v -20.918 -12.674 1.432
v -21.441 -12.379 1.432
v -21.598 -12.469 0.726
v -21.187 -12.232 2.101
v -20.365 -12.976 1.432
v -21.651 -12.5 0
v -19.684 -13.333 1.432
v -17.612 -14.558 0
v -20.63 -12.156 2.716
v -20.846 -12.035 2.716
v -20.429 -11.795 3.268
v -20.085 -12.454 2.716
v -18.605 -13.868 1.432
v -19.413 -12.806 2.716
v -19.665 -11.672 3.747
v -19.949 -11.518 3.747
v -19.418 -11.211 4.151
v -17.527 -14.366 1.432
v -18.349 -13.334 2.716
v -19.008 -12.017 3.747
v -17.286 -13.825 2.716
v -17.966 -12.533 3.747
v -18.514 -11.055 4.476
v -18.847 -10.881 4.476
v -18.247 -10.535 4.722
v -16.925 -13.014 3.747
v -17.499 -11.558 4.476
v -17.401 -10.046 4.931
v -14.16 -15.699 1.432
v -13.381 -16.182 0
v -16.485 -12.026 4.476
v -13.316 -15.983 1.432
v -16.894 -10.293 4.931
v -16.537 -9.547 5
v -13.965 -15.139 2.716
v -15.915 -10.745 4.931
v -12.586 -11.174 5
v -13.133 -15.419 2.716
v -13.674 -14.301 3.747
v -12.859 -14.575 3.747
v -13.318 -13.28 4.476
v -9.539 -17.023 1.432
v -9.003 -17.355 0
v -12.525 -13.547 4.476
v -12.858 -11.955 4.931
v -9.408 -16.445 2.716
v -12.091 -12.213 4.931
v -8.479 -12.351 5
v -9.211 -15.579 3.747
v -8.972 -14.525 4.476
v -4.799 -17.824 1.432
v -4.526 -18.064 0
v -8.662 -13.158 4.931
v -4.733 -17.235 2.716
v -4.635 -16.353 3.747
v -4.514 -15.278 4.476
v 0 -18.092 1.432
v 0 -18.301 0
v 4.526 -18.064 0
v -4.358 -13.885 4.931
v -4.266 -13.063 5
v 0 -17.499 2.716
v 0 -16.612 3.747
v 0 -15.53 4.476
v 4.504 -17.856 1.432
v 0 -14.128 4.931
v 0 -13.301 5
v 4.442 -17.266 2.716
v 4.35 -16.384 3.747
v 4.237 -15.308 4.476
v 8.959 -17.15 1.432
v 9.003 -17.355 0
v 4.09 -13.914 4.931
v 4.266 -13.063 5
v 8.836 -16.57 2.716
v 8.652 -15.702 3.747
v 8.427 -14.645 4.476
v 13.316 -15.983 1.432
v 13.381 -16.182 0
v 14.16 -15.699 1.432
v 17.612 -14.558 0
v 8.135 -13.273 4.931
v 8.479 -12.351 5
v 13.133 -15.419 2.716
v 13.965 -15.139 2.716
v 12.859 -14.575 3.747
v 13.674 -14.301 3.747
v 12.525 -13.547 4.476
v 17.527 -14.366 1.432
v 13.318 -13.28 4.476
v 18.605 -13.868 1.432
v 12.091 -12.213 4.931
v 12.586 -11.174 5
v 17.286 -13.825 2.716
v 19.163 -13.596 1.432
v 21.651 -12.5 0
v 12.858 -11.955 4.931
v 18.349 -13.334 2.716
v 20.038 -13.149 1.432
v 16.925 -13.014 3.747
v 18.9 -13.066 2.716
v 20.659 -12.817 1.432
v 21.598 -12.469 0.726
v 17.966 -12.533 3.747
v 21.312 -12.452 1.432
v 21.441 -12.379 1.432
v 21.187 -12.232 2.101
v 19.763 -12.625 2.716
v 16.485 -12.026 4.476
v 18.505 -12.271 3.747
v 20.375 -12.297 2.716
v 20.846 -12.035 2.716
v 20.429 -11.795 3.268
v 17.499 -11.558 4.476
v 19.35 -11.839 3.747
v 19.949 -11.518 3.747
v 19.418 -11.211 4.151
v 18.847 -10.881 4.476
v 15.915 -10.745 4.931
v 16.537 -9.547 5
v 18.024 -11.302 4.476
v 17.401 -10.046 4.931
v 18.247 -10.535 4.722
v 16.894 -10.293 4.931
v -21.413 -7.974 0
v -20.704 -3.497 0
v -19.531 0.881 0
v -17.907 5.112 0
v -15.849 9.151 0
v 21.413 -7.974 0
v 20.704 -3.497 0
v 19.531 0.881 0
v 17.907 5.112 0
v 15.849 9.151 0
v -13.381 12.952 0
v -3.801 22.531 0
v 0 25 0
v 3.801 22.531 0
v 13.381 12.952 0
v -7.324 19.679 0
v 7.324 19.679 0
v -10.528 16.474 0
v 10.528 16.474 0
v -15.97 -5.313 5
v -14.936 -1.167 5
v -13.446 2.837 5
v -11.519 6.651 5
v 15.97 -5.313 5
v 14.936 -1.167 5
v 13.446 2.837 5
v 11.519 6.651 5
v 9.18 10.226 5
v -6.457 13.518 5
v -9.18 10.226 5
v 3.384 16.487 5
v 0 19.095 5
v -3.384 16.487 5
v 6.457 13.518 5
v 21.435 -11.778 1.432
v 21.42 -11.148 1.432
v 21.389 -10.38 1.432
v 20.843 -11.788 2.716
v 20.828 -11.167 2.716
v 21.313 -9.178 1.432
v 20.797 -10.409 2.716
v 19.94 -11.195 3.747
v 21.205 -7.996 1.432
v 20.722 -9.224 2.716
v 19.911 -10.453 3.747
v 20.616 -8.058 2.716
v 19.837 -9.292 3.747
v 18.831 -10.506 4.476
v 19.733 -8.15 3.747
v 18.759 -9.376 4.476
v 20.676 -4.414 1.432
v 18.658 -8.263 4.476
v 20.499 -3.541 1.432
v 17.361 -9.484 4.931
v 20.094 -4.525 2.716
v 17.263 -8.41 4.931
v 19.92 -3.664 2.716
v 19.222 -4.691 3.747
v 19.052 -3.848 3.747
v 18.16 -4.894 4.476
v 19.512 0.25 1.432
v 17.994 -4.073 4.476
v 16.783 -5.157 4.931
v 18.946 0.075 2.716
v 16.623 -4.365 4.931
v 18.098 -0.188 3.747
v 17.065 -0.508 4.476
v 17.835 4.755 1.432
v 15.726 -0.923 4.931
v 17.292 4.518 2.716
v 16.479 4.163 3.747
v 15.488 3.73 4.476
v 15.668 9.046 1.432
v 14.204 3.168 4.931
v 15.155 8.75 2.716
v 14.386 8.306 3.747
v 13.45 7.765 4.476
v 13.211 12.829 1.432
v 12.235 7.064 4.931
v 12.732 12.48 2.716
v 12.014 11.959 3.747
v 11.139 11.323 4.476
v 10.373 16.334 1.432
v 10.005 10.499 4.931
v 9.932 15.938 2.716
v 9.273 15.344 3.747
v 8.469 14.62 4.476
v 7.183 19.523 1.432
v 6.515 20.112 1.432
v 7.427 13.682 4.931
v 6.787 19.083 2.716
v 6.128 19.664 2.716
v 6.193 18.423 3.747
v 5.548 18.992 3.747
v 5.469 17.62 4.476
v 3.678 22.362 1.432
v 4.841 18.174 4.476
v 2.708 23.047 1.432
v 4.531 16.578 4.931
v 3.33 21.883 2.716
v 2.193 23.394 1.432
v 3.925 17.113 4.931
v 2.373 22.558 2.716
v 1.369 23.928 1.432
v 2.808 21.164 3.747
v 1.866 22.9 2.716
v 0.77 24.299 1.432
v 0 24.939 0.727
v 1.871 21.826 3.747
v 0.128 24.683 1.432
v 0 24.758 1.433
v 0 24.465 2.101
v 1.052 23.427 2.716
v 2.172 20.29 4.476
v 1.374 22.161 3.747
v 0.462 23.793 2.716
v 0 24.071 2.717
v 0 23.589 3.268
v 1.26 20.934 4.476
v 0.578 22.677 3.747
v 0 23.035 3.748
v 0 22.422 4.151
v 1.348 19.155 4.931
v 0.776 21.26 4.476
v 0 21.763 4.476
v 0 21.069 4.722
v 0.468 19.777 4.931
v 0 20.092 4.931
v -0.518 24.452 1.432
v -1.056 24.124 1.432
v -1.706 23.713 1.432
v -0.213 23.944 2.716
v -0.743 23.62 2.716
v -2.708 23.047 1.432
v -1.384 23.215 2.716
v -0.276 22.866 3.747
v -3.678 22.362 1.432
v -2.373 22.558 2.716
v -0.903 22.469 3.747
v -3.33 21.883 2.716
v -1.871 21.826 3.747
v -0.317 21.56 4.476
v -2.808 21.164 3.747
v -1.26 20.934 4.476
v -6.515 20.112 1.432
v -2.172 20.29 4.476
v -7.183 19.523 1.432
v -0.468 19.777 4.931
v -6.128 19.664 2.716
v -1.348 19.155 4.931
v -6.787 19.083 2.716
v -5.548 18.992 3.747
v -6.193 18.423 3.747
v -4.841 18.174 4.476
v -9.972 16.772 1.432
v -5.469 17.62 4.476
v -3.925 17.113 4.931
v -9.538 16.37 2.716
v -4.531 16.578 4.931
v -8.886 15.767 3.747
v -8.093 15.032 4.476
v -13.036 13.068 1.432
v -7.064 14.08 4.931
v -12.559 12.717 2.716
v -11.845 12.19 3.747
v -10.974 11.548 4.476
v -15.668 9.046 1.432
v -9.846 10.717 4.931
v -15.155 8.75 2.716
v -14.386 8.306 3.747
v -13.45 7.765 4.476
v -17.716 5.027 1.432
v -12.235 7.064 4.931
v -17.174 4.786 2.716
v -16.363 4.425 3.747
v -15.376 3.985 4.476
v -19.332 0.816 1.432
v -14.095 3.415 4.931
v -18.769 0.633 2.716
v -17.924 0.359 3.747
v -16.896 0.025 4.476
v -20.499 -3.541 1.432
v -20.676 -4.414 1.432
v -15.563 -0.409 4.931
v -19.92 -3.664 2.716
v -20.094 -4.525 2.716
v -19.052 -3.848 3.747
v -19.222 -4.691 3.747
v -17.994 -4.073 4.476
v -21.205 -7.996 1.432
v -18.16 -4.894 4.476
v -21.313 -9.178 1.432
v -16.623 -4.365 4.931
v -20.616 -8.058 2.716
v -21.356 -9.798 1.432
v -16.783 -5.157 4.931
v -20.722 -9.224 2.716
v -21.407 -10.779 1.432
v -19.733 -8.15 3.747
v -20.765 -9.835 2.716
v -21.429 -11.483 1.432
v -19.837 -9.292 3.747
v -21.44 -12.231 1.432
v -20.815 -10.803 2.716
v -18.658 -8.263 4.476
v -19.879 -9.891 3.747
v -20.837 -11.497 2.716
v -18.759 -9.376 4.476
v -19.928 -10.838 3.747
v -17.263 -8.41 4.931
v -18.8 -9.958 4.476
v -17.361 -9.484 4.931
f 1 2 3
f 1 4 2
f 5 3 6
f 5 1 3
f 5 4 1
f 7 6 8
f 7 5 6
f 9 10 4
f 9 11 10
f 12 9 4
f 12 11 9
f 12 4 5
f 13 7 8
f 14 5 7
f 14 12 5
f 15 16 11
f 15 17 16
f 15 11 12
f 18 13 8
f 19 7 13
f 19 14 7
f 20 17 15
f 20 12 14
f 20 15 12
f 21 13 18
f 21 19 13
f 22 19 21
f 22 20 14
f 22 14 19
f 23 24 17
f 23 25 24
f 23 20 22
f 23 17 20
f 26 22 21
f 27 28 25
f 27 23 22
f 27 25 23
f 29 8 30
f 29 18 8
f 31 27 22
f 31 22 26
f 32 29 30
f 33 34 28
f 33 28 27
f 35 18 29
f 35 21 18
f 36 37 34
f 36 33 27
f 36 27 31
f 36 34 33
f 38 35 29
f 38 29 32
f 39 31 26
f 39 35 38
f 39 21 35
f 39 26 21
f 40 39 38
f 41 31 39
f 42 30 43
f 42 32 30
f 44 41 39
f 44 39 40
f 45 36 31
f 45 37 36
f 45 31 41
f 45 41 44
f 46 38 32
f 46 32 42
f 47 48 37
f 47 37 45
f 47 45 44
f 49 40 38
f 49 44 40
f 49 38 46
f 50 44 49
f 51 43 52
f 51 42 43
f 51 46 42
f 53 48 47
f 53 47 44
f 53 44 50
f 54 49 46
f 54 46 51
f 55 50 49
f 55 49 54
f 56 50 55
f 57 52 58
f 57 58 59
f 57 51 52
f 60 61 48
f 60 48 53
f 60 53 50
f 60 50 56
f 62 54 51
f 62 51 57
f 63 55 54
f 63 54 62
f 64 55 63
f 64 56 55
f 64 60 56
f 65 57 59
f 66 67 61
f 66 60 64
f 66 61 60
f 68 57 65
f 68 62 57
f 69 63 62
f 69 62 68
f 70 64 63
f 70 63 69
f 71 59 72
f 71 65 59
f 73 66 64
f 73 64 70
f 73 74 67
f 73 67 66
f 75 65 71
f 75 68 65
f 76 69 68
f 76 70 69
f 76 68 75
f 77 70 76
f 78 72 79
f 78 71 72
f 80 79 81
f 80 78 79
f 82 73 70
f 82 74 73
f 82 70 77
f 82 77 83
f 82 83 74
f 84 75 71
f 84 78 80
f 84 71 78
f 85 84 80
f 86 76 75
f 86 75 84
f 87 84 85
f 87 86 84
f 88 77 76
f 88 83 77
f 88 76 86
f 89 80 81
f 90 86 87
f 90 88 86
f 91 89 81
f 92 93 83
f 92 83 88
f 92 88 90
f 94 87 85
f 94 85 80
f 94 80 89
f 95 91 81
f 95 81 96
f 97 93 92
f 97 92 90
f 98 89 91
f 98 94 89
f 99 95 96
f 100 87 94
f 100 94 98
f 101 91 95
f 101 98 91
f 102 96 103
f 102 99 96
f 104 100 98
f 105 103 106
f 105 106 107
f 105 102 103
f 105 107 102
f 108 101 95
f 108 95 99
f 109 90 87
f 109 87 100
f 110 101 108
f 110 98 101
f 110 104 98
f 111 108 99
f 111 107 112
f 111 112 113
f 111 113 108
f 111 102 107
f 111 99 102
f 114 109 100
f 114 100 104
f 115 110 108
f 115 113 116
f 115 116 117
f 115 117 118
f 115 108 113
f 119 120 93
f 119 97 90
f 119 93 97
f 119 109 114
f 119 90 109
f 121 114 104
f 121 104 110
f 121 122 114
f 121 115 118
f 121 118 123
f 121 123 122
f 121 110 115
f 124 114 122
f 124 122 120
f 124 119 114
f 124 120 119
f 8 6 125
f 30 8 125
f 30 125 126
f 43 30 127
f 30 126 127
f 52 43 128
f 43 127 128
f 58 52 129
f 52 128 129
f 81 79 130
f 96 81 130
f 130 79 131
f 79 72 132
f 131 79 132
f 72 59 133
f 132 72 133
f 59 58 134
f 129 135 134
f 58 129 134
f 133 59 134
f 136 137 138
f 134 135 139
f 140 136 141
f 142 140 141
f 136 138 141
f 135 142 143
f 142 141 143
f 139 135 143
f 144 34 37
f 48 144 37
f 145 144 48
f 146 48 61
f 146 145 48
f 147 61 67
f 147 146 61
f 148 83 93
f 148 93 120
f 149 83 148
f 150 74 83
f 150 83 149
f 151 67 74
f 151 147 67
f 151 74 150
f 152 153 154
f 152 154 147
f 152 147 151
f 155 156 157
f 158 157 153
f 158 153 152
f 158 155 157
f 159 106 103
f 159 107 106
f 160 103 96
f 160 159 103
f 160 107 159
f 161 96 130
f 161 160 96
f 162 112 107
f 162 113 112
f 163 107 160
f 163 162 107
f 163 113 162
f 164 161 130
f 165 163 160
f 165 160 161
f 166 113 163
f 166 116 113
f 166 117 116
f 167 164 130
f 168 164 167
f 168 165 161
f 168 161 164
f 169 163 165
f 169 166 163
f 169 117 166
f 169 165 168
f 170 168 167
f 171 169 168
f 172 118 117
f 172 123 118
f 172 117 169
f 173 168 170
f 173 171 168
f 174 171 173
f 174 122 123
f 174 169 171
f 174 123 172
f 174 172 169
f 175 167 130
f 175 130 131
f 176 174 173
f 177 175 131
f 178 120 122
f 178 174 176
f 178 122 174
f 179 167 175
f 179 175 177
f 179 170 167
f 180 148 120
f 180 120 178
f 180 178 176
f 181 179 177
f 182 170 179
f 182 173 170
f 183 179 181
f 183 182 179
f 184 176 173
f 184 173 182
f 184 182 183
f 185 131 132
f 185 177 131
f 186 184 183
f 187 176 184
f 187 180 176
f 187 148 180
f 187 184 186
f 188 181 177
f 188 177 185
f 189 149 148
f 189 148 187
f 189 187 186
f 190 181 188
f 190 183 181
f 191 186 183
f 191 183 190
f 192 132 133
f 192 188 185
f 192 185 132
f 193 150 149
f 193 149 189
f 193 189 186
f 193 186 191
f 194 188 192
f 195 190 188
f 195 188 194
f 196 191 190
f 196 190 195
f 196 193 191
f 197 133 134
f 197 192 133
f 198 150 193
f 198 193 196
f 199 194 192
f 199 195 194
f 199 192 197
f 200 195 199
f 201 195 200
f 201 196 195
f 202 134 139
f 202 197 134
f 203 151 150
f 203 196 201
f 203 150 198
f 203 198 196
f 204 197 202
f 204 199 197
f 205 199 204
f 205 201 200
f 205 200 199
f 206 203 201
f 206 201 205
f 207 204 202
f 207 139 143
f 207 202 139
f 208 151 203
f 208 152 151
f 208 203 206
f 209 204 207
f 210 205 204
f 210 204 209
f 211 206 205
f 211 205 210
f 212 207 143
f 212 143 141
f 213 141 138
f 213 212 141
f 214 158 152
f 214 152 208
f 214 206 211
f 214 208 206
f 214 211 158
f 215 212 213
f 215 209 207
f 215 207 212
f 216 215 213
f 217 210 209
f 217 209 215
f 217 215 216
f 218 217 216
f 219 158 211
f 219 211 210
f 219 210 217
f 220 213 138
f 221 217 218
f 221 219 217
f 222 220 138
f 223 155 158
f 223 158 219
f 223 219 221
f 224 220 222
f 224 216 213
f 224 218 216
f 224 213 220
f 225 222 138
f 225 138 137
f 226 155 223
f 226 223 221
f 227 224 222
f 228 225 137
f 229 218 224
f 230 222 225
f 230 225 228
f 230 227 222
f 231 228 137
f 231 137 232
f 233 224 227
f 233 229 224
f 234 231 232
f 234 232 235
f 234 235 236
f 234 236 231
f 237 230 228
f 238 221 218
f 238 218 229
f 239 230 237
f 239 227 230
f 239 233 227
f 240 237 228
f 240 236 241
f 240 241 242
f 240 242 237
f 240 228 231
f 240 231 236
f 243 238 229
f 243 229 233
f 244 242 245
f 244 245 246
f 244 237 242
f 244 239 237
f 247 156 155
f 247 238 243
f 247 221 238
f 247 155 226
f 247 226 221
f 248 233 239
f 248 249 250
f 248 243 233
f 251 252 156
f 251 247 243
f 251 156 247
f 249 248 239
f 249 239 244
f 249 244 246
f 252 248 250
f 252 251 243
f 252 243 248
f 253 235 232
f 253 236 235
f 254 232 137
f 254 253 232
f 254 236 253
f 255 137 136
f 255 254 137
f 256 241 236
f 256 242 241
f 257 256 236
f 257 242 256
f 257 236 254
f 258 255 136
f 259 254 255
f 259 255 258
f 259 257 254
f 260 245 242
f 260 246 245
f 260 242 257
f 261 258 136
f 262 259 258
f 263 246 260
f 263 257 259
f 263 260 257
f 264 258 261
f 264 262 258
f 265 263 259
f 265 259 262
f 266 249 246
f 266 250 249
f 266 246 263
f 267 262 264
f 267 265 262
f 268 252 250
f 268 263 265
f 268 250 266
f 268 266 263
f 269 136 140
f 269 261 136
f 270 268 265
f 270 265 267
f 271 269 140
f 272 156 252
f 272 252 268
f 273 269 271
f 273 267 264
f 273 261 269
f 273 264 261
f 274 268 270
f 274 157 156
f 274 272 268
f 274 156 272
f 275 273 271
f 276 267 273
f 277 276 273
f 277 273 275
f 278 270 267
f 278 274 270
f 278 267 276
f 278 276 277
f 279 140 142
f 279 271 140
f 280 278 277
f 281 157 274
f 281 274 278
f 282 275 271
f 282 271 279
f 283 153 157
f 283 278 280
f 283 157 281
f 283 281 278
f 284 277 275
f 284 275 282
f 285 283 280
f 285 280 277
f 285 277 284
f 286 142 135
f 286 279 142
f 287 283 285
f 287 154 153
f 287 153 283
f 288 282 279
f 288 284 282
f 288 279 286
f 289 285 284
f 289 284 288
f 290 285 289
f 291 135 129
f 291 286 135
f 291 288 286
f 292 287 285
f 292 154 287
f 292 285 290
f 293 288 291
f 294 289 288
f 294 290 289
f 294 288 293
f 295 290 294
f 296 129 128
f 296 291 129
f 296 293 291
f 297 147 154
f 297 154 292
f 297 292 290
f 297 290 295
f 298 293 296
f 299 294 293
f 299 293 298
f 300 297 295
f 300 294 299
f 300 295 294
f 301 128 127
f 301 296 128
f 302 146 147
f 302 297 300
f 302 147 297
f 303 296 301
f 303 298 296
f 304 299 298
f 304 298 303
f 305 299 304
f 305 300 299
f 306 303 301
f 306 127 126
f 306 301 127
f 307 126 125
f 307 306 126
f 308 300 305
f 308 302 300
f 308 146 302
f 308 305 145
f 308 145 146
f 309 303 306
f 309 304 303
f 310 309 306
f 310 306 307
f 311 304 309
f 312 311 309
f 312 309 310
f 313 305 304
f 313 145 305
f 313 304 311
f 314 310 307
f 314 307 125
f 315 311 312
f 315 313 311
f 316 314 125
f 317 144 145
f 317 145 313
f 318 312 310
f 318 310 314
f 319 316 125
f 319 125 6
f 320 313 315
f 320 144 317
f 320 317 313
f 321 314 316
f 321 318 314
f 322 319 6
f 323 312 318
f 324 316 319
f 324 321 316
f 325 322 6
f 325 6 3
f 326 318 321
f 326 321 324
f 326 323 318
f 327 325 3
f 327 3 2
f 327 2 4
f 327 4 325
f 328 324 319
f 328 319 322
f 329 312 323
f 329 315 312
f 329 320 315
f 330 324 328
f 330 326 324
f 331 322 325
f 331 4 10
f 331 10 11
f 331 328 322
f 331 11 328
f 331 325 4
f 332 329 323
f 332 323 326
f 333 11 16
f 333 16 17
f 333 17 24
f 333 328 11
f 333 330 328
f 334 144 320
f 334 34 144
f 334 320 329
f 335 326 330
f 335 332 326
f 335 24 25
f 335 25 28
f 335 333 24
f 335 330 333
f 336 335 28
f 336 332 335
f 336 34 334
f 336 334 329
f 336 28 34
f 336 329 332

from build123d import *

# Parameters (mm, degrees)
F1_DEPTH = 5
F2_R     = 4.99999


# Not quite as in the source:
# - a fillet or chamfer is up to 0.001 mm smaller than in the source, because OpenCascade refuses the exact size
# - a feature of the source that left no trace in its solid (it failed there, or was rolled back) is left out


with BuildPart() as f1:
    # F0 (on Top) → F1 (new body)
    with BuildSketch(Plane.XY):
        with BuildLine():
            ThreePointArc((-21.6506350946, -12.5), (0, -18.3012701892), (21.6506350946, -12.5))
            ThreePointArc((21.6506350946, -12.5), (15.8493649054, 9.1506350946), (0, 25))
            ThreePointArc((0, 25), (-15.8493649054, 9.1506350946), (-21.6506350946, -12.5))
        make_face()
    extrude(amount=F1_DEPTH)

    # F2 (radius 5 in the source; OpenCascade refuses exactly that, so slightly less here)
    f2_edges = [f1.edges().sort_by_distance(p)[0] for p in [
        (-15.849365, 9.150635, 5),
        (0, -18.30127, 5),
        (15.849365, 9.150635, 5),
    ]]
    fillet(f2_edges, radius=F2_R)


solid = f1.part
